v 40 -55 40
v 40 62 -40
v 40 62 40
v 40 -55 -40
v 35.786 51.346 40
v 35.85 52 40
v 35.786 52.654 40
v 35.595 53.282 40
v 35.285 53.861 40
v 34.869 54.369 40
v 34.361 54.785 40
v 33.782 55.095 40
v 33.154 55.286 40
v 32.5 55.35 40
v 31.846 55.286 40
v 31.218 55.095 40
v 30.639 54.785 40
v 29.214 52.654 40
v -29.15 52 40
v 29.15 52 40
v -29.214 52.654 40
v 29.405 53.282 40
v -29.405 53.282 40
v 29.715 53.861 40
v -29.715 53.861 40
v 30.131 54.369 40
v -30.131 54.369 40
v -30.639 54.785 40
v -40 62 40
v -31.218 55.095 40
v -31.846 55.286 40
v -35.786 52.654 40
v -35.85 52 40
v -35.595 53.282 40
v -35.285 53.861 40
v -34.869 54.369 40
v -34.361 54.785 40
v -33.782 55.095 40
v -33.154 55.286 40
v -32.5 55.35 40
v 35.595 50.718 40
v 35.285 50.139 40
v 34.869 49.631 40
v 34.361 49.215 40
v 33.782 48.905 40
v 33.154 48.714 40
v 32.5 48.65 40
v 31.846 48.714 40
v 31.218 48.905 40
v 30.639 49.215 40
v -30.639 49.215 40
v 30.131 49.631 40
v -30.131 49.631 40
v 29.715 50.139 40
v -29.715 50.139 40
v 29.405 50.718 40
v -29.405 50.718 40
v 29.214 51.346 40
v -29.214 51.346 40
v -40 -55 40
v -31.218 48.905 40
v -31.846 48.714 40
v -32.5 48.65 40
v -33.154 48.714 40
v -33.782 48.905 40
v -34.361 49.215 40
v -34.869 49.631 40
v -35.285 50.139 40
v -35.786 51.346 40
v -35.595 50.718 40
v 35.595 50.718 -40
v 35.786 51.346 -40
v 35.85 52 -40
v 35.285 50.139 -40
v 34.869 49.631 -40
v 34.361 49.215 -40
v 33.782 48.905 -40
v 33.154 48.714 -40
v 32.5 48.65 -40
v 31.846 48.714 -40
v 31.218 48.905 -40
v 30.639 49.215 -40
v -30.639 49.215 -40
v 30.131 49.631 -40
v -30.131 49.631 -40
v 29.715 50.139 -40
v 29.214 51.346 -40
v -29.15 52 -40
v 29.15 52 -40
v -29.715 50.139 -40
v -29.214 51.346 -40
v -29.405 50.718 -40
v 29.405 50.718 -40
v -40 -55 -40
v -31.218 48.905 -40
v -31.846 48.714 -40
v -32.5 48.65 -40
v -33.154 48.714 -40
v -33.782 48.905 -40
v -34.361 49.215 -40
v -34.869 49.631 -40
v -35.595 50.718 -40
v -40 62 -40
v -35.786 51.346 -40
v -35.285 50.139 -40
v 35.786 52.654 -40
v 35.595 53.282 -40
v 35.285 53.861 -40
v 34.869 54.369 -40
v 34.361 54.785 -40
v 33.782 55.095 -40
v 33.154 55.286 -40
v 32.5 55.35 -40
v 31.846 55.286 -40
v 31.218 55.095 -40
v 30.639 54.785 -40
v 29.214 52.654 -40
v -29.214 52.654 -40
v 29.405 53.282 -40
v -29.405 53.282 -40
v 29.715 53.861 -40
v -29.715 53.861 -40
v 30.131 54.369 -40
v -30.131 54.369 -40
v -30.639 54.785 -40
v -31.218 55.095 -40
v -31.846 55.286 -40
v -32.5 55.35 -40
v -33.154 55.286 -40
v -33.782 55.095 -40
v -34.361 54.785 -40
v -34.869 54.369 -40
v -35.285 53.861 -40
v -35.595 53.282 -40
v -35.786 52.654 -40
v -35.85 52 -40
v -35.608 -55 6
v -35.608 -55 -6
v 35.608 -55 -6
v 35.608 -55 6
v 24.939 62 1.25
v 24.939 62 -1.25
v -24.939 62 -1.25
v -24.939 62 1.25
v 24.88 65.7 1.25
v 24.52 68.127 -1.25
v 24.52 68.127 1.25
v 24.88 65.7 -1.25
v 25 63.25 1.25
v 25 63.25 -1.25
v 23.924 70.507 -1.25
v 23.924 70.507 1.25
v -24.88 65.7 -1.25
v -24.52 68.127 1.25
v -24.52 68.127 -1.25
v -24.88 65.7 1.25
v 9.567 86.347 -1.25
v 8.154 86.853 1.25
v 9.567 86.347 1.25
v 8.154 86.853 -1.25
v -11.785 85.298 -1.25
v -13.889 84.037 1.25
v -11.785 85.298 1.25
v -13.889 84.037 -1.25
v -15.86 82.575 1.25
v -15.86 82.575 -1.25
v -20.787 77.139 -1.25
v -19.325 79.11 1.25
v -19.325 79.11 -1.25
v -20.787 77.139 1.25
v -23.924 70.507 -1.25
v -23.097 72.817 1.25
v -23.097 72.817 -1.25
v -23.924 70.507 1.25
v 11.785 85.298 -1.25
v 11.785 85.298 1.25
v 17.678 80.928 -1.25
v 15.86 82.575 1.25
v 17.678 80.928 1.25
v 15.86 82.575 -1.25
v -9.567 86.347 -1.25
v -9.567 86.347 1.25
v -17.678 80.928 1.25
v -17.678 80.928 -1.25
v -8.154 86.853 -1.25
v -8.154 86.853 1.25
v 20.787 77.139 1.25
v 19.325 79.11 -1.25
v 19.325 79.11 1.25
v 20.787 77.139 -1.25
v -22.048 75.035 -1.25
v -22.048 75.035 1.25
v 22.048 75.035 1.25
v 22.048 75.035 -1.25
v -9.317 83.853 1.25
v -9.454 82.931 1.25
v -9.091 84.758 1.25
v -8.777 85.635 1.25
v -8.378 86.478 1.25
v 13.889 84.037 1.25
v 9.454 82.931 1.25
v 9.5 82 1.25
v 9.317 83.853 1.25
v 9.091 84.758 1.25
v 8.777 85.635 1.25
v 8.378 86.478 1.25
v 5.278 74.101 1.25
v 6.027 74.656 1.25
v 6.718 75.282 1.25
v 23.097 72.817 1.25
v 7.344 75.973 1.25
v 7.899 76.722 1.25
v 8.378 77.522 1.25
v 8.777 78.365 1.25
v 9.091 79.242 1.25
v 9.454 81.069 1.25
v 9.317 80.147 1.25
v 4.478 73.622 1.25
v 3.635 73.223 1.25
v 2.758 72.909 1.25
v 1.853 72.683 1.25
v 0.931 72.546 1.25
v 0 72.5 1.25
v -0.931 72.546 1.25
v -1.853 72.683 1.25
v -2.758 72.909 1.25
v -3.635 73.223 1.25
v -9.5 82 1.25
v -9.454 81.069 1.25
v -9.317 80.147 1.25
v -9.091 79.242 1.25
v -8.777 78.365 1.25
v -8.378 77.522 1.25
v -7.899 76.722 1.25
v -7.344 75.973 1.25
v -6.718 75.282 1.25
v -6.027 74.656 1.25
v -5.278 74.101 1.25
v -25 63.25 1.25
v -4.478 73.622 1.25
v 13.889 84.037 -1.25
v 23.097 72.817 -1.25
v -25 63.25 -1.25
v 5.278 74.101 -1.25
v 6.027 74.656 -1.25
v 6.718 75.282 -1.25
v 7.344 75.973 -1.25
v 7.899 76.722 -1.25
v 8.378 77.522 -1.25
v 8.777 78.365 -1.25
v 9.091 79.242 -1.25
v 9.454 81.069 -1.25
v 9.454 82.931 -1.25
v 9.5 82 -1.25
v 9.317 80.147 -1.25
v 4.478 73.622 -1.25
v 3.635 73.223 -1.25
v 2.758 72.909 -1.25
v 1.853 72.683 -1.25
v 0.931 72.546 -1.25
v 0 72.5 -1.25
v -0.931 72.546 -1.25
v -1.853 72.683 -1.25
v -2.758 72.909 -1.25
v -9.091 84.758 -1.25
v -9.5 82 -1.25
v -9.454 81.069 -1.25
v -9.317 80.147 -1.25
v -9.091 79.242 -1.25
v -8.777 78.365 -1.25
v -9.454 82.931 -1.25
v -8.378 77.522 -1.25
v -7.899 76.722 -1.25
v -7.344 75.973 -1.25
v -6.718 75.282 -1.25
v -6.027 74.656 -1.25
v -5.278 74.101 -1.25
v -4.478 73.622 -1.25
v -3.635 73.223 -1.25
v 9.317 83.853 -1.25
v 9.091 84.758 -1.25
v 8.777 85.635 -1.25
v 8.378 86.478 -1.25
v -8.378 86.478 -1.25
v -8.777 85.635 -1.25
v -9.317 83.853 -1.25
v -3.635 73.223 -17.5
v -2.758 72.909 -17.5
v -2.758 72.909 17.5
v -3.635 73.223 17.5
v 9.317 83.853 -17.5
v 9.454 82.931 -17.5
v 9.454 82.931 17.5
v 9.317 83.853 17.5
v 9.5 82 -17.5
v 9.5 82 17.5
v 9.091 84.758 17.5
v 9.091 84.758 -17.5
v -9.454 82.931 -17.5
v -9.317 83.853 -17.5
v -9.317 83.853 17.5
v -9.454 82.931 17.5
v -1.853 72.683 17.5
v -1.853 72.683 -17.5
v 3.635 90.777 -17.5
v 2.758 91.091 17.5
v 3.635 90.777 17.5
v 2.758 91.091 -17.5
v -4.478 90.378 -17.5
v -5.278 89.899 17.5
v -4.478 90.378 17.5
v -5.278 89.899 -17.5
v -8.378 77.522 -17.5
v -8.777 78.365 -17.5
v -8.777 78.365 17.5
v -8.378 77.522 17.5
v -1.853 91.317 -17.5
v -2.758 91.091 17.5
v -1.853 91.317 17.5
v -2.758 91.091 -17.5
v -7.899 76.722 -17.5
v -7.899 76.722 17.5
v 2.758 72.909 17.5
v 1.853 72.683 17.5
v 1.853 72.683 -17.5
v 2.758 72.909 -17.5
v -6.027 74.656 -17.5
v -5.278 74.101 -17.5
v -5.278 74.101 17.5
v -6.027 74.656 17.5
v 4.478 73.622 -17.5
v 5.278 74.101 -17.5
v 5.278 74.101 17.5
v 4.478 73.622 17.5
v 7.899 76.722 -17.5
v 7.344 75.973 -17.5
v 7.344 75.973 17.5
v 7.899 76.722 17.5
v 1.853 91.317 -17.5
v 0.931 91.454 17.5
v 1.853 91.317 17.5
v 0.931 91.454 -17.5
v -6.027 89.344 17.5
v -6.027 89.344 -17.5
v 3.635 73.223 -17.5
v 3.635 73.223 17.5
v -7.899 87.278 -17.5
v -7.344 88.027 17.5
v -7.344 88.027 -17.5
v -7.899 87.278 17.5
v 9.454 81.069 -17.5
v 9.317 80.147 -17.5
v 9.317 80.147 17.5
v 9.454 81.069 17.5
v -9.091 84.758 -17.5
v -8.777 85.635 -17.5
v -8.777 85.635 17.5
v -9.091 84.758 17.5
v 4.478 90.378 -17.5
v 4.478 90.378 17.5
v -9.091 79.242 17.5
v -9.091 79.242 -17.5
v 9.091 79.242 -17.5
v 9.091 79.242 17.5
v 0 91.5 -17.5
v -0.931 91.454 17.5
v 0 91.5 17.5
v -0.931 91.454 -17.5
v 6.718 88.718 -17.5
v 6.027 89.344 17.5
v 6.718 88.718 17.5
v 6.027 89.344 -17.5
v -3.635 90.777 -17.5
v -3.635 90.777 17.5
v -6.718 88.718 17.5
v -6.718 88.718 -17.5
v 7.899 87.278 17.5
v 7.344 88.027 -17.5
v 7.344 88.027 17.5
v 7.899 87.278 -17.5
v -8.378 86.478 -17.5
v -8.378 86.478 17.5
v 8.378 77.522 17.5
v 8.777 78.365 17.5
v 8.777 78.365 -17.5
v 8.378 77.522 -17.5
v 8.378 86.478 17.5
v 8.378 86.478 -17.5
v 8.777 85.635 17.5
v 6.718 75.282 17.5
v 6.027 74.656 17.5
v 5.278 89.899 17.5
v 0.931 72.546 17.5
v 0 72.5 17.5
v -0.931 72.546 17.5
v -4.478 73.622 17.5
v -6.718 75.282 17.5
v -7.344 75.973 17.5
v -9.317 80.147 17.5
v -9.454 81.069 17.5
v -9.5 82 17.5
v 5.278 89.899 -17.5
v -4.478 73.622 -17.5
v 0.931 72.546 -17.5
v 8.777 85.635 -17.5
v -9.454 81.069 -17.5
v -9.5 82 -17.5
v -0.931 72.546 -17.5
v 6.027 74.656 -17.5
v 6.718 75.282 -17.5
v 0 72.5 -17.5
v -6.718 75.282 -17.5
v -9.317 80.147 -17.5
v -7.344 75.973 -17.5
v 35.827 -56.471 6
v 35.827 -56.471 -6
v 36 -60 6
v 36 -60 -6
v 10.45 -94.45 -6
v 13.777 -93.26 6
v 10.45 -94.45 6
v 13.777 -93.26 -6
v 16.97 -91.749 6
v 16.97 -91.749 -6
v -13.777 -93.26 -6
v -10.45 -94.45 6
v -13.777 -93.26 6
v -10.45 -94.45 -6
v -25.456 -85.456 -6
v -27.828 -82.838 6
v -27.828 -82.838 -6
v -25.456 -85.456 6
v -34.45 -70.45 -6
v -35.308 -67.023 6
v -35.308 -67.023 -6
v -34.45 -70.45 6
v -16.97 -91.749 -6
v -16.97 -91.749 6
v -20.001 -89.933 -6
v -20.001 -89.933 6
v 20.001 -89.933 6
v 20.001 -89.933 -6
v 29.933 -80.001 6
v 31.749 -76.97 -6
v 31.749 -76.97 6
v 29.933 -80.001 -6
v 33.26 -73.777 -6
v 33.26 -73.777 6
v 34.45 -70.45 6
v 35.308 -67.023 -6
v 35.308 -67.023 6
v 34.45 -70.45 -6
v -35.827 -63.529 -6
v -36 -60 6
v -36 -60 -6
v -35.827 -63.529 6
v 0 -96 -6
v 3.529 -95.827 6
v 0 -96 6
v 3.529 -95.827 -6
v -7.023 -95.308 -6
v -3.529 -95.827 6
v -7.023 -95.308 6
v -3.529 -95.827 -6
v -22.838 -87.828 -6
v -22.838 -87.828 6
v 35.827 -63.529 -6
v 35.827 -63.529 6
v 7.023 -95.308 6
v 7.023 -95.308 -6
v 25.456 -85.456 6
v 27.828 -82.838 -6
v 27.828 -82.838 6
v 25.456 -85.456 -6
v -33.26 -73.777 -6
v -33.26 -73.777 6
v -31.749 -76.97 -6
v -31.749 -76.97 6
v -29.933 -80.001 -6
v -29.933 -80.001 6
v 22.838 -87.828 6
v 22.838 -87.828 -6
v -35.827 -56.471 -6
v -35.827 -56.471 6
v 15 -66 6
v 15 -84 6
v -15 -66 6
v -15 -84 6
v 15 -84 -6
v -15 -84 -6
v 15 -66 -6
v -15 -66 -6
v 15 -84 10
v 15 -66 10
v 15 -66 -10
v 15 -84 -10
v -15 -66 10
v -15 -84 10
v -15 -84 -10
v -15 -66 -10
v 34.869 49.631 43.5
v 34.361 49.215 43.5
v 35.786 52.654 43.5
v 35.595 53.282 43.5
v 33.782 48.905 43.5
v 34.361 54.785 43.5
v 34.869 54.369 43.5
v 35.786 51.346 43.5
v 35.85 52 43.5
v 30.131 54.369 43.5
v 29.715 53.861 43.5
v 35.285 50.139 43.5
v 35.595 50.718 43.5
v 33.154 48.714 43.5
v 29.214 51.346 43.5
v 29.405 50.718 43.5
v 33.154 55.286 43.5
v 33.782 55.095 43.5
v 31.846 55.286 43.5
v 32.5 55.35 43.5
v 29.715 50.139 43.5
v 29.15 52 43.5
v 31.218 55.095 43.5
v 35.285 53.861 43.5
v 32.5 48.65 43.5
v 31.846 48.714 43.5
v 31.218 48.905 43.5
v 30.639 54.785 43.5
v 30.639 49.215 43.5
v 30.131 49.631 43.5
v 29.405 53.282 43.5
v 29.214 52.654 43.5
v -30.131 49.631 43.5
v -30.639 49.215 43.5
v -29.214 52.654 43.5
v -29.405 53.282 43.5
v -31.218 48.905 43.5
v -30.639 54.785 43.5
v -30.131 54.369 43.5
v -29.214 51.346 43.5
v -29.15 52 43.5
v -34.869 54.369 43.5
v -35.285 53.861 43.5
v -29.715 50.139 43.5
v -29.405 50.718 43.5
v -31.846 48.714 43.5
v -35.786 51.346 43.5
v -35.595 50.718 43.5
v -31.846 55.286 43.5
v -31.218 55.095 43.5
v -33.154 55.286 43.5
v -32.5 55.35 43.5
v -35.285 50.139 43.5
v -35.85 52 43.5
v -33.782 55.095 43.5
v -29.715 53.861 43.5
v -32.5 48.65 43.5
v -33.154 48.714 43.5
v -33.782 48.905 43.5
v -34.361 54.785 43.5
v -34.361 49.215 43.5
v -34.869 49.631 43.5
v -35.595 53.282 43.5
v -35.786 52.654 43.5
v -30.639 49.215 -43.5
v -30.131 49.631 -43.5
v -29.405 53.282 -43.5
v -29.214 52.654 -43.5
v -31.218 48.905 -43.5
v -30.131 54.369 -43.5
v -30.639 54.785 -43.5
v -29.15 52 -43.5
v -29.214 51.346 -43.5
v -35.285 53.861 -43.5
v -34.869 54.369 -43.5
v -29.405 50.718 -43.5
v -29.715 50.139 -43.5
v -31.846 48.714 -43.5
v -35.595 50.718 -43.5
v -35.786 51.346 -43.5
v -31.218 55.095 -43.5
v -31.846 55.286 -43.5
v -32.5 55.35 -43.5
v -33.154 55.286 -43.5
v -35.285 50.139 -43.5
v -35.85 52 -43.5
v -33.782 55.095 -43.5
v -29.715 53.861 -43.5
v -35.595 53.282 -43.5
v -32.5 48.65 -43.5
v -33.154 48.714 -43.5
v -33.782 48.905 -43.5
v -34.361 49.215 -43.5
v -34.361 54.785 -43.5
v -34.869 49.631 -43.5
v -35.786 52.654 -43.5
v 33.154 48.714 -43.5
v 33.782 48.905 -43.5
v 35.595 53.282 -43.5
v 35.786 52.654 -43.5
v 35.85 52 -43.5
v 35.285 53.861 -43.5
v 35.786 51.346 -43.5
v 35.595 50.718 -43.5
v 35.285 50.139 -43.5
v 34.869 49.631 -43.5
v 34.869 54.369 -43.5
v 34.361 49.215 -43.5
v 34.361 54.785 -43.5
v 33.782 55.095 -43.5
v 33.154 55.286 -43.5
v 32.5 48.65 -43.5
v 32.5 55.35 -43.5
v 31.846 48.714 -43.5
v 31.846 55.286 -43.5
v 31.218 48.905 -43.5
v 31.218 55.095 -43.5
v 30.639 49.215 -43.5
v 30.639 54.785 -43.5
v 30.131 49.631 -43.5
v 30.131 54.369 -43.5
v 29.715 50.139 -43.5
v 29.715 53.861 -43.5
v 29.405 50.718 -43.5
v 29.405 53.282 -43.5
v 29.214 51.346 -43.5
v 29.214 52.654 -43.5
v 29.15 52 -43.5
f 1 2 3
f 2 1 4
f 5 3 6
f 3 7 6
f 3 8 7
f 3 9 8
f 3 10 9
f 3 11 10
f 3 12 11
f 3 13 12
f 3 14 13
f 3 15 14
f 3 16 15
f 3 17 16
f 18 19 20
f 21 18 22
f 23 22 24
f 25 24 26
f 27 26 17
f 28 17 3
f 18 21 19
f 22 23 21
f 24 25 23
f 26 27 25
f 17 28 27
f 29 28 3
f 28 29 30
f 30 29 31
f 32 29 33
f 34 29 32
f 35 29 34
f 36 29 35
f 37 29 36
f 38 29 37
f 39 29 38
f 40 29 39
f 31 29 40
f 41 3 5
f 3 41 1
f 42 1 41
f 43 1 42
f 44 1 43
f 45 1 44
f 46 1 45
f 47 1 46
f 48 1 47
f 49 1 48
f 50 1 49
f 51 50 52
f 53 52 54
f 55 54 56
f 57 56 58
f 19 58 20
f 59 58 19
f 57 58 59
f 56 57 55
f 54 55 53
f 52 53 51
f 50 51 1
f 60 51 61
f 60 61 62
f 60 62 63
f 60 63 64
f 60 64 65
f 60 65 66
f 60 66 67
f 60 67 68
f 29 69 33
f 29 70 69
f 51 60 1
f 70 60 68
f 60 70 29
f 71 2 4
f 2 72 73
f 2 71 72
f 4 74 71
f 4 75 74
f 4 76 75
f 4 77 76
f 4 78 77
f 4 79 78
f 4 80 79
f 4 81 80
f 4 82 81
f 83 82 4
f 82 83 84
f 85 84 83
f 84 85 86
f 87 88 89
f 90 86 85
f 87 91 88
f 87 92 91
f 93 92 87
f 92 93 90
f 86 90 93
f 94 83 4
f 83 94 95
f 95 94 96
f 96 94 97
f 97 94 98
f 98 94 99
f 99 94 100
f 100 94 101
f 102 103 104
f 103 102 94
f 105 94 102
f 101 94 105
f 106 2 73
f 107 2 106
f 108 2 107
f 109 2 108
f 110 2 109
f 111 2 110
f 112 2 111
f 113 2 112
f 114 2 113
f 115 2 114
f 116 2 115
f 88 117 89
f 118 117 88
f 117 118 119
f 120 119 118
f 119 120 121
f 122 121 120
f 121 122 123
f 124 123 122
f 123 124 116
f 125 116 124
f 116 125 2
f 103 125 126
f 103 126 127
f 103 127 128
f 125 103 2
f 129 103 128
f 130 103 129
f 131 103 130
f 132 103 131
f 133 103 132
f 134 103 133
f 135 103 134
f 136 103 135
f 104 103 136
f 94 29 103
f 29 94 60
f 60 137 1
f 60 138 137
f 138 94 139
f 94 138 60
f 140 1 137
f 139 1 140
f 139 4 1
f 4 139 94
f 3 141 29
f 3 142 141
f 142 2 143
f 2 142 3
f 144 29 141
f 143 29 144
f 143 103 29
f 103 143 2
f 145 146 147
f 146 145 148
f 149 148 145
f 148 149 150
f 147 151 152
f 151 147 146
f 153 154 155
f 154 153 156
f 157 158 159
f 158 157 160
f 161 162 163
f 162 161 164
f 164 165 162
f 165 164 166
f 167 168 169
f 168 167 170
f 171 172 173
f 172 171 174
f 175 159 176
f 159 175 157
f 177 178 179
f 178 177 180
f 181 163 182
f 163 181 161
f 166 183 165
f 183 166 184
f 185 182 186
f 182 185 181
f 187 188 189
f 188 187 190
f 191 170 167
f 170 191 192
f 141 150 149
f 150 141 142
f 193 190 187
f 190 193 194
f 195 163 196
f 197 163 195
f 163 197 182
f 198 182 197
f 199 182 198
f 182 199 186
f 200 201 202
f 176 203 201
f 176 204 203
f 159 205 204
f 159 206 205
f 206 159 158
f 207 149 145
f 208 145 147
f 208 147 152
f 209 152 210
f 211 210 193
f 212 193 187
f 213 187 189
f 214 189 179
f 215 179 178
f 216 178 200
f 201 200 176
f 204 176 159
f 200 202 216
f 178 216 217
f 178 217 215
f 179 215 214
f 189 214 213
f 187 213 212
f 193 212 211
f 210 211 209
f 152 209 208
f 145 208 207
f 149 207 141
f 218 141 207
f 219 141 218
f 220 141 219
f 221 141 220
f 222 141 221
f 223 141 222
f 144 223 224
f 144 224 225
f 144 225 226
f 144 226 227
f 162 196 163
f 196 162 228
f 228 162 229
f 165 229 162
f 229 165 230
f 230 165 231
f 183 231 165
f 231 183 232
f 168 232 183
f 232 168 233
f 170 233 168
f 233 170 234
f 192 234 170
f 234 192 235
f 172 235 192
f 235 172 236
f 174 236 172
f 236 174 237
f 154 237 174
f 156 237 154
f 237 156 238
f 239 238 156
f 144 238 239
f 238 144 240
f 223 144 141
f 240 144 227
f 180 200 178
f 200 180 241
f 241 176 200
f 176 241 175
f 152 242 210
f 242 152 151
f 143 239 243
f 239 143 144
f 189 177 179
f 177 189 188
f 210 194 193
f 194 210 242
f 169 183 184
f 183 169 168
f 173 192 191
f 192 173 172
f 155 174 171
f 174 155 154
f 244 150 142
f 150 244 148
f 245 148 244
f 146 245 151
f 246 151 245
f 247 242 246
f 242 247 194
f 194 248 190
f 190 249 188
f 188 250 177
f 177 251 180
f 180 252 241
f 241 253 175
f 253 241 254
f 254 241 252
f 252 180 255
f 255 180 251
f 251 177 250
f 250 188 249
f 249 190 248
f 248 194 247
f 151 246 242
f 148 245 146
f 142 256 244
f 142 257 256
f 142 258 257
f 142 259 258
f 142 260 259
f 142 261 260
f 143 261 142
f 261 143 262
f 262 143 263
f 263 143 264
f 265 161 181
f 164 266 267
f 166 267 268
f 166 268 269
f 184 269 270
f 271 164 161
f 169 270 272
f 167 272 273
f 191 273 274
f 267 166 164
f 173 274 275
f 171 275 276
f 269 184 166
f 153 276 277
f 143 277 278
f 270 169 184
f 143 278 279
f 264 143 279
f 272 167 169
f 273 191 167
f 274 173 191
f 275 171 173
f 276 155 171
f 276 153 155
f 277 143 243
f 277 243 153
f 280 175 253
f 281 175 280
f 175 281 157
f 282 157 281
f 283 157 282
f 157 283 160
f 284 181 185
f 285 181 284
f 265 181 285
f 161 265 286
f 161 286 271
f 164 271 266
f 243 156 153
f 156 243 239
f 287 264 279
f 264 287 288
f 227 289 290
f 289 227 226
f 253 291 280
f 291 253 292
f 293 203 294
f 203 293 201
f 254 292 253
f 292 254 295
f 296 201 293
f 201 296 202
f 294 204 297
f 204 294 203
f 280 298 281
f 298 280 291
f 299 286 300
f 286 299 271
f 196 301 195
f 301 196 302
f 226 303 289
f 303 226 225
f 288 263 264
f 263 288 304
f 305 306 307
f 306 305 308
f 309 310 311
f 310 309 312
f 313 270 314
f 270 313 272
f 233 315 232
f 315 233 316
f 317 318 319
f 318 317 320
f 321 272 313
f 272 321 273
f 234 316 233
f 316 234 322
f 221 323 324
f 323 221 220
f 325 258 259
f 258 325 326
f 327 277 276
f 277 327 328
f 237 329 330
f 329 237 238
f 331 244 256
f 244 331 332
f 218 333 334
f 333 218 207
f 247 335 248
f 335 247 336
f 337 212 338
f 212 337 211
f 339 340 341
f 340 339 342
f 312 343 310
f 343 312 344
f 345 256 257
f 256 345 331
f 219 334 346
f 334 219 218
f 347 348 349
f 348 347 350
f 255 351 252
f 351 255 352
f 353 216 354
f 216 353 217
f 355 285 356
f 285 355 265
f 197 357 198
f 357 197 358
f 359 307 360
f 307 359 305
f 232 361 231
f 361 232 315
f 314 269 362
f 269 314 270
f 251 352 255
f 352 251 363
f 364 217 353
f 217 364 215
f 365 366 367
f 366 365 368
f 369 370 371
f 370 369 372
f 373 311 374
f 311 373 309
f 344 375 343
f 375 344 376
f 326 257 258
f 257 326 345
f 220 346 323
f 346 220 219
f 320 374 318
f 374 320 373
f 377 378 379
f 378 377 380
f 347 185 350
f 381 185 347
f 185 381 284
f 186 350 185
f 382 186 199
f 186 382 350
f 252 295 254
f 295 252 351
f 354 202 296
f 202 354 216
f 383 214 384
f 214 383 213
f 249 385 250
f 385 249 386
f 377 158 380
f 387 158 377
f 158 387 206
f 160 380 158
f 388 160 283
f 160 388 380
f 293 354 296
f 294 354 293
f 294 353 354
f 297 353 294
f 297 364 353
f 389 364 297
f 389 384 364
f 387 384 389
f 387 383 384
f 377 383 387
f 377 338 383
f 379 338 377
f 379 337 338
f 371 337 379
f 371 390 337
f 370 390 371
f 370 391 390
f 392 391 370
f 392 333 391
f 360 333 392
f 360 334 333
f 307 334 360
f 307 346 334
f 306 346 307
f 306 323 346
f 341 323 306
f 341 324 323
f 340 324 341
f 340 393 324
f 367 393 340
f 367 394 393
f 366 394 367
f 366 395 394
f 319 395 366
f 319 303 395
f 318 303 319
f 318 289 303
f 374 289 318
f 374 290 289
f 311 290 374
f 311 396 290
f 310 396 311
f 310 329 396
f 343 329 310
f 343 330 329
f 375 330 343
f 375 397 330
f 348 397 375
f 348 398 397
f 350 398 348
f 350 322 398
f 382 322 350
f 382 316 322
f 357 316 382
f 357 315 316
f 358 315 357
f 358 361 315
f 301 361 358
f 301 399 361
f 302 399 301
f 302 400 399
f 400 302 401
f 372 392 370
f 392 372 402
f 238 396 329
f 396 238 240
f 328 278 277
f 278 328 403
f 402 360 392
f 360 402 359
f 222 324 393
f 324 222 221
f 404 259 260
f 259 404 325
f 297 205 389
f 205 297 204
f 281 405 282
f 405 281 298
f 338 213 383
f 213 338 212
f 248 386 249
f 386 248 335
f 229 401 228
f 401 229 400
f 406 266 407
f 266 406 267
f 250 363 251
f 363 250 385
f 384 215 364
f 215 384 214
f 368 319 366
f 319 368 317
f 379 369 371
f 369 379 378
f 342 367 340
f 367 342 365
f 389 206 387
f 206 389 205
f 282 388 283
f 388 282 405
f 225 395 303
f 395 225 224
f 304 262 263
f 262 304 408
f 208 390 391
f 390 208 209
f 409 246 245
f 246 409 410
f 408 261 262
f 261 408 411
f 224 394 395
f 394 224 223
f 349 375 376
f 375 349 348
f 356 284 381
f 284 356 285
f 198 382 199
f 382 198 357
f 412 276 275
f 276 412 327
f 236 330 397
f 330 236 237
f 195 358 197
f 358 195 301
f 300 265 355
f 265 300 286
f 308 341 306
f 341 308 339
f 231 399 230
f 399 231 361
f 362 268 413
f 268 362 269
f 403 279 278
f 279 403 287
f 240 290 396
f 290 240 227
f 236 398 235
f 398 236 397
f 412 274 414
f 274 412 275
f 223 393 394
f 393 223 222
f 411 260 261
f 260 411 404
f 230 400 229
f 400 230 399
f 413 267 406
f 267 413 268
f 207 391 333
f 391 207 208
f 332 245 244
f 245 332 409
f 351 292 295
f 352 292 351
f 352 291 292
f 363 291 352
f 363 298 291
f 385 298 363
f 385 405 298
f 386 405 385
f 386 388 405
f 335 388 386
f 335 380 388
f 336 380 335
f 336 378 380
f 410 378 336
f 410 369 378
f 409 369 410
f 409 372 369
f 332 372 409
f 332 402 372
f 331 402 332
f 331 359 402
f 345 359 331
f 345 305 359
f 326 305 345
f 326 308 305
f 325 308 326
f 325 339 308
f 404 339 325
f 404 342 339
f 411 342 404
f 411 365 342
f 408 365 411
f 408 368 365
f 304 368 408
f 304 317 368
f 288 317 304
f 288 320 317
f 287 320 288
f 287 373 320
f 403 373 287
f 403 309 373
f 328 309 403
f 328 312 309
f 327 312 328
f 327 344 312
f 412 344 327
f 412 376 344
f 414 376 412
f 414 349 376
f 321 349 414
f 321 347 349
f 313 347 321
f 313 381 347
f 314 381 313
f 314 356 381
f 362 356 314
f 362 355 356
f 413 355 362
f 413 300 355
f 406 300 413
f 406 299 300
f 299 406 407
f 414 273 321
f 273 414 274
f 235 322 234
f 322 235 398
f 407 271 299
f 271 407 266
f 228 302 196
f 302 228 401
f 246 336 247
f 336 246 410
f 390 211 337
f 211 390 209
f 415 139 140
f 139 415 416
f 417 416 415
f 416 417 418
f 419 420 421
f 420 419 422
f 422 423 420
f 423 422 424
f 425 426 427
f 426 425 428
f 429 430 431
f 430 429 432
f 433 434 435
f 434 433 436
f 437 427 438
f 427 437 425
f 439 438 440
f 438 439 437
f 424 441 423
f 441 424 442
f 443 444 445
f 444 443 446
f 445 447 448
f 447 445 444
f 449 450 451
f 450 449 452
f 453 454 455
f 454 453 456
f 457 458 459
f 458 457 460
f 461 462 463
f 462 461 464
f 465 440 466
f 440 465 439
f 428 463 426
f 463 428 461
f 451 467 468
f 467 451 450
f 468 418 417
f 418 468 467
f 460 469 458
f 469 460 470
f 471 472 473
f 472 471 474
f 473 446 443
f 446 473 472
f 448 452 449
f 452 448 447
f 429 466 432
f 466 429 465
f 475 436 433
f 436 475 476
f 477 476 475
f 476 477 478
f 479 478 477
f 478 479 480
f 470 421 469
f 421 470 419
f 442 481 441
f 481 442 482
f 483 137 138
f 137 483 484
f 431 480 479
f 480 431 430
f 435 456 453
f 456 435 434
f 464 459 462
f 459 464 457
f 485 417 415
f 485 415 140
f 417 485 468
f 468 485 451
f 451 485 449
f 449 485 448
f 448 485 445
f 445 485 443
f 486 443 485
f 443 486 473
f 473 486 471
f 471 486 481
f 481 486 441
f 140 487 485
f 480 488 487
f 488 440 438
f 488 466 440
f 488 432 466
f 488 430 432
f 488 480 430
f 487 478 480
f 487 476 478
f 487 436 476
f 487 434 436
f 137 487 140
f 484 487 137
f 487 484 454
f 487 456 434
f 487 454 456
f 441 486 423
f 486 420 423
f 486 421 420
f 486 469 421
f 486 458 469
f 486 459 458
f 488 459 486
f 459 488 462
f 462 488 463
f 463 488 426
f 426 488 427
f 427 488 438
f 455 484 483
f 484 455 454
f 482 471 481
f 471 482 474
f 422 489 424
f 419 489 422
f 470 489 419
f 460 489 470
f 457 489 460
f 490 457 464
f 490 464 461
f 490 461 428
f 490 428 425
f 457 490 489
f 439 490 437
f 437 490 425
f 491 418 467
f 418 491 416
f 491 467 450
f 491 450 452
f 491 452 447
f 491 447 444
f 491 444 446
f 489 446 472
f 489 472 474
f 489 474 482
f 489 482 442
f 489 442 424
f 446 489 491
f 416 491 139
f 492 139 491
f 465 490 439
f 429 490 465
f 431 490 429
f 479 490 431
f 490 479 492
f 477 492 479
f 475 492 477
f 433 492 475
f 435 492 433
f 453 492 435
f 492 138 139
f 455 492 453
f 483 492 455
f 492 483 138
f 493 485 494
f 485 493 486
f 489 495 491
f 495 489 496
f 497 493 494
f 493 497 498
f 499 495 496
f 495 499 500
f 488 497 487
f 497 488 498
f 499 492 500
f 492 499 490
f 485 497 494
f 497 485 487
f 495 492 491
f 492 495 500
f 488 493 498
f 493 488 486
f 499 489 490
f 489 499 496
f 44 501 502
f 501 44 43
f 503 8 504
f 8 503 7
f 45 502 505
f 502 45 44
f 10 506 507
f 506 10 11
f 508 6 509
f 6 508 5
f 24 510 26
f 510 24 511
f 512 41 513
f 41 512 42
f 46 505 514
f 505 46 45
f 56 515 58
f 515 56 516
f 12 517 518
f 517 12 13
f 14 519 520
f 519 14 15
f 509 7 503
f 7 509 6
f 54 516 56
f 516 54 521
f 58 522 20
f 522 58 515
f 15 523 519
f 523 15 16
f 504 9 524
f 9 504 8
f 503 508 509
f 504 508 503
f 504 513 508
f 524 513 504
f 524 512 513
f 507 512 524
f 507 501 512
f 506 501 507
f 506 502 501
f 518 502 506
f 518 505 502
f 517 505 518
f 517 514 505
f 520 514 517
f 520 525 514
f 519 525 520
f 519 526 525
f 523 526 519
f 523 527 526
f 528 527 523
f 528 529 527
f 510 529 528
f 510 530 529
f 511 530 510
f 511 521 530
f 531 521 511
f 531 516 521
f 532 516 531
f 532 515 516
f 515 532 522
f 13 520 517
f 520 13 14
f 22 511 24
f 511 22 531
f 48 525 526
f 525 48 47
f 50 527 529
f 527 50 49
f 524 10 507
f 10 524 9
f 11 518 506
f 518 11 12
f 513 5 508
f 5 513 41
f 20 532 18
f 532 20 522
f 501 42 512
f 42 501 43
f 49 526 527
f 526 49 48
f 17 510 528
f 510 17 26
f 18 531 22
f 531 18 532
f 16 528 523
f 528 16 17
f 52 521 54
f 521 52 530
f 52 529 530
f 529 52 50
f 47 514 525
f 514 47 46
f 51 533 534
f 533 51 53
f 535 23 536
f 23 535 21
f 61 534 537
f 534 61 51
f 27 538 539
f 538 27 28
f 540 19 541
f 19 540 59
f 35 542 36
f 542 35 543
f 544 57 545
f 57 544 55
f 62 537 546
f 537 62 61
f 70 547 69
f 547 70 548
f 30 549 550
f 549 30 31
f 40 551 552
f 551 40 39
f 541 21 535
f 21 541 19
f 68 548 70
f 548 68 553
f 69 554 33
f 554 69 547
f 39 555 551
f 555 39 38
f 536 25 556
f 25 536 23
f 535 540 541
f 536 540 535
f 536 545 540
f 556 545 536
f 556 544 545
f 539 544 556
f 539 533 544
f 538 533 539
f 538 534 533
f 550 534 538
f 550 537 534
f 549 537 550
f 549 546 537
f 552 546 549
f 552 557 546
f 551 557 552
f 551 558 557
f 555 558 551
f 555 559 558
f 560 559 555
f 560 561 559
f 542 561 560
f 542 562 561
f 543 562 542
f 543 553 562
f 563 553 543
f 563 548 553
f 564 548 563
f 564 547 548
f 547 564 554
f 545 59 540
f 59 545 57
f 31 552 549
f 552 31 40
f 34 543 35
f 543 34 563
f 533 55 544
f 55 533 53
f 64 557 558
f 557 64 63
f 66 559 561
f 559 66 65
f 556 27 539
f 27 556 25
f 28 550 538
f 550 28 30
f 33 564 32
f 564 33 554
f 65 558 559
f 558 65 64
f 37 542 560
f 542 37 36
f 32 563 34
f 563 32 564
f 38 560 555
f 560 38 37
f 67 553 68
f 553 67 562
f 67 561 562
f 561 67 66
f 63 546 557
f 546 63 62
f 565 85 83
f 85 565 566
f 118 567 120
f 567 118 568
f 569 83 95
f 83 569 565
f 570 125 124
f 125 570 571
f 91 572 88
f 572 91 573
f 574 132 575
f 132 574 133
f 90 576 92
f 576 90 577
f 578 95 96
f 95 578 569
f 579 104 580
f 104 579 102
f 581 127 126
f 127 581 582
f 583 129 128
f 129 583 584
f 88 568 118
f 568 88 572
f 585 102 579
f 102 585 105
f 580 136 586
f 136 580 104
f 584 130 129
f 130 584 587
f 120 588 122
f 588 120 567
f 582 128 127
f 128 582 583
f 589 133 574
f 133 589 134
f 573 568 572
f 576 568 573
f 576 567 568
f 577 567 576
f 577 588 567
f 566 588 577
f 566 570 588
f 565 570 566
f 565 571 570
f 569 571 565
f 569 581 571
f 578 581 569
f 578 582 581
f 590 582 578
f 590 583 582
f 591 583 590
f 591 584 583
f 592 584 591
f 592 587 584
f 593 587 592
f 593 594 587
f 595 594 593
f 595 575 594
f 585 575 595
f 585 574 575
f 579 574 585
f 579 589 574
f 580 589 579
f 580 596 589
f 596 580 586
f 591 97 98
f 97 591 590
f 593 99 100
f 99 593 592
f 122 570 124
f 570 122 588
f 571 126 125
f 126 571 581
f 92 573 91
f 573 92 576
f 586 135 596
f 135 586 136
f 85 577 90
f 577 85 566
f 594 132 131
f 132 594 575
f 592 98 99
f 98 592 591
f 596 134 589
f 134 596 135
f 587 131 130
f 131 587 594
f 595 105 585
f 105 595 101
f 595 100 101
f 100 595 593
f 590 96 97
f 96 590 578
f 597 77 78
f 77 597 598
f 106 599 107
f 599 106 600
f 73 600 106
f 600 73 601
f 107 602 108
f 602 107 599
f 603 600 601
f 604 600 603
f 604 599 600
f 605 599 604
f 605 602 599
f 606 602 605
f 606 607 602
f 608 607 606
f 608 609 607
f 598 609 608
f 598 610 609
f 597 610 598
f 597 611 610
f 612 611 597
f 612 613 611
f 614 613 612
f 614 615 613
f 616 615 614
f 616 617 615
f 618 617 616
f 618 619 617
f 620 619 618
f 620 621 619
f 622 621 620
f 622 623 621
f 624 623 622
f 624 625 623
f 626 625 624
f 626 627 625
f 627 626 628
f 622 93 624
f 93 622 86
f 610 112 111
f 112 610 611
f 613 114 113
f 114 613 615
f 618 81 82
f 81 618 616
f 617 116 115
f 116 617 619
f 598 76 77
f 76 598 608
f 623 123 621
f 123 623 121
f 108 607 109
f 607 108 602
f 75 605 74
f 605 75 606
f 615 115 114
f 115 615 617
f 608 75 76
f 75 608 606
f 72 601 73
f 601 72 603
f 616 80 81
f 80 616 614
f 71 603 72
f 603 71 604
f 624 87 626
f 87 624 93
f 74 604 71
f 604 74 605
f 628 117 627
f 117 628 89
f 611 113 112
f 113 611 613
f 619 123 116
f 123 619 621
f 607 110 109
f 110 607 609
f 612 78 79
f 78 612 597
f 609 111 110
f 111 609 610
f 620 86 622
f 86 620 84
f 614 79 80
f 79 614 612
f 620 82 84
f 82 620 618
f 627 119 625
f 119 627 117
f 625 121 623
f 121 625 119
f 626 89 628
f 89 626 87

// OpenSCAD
// Parameters
motor_frame_size_mm = 80; //[40:160:1]
body_length_mm = 110; //[55:220:1]
body_corner_radius_mm = 2; //[1:6:1]
faceplate_thickness_mm = 8; //[4:16:1]
faceplate_size_mm = 80; //[40:160:1]
mount_hole_pattern_mm = 65; //[40:120:1]
mount_hole_diameter_mm = 6.5; //[3:12:0.1]
mount_hole_depth_mm = 12; //[6:30:1]
pilot_diameter_mm = 50; //[25:100:1]
pilot_length_mm = 2.5; //[1:8:0.1]
shaft_diameter_mm = 19; //[6:40:0.1]
shaft_length_mm = 35; //[10:80:1]
rear_cap_diameter_mm = 72; //[36:140:1]
rear_cap_length_mm = 12; //[6:30:1]
rear_connector_width_mm = 30; //[15:60:1]
rear_connector_height_mm = 20; //[10:50:1]
rear_connector_length_mm = 18; //[8:40:1]
overlap_mm = 1; //[0.5:2:0.1]
hole_clearance_mm = 0.2; //[0:0.6:0.05]

// Servo Motor - complete geometry
module servo_motor() {
  color([0.15, 0.2, 0.35]) {
    // Motor Body
    translate([0, 0, 0])
      cube([motor_frame_size_mm, body_length_mm, motor_frame_size_mm], center=true);

    // Front Faceplate
    translate([0, (body_length_mm/2) + (faceplate_thickness_mm/2) - overlap_mm, 0])
      cube([faceplate_size_mm, faceplate_thickness_mm, faceplate_size_mm], center=true);

    // Shaft Boss/Flange
    translate([0, (body_length_mm/2) + faceplate_thickness_mm - overlap_mm + (pilot_length_mm/2), 0])
      cylinder(r=pilot_diameter_mm/2, h=pilot_length_mm, center=true, $fn=64);

    // Output Shaft
    color("Silver")
    translate([0, (body_length_mm/2) + faceplate_thickness_mm + pilot_length_mm - overlap_mm + (shaft_length_mm/2), 0])
      cylinder(r=shaft_diameter_mm/2, h=shaft_length_mm, center=true, $fn=64);

    // Rear Cap
    translate([0, -(body_length_mm/2) - (rear_cap_length_mm/2) + overlap_mm, 0])
      cylinder(r=rear_cap_diameter_mm/2, h=rear_cap_length_mm, center=true, $fn=64);

    // Rear Connector Block
    translate([0, -(body_length_mm/2) - rear_cap_length_mm + overlap_mm - (rear_connector_length_mm/2), 0])
      cube([rear_connector_width_mm, rear_connector_length_mm, rear_connector_height_mm], center=true);
  }

  // Mounting Holes
  color("Black")
  difference() {
    union() {
      translate([mount_hole_pattern_mm/2, (body_length_mm/2) + (faceplate_thickness_mm/2) - overlap_mm - (mount_hole_depth_mm/2), mount_hole_pattern_mm/2])
        cylinder(r=(mount_hole_diameter_mm + hole_clearance_mm)/2, h=faceplate_thickness_mm + mount_hole_depth_mm + overlap_mm*2, center=true, $fn=32);
      translate([-mount_hole_pattern_mm/2, (body_length_mm/2) + (faceplate_thickness_mm/2) - overlap_mm - (mount_hole_depth_mm/2), mount_hole_pattern_mm/2])
        cylinder(r=(mount_hole_diameter_mm + hole_clearance_mm)/2, h=faceplate_thickness_mm + mount_hole_depth_mm + overlap_mm*2, center=true, $fn=32);
      translate([-mount_hole_pattern_mm/2, (body_length_mm/2) + (faceplate_thickness_mm/2) - overlap_mm - (mount_hole_depth_mm/2), -mount_hole_pattern_mm/2])
        cylinder(r=(mount_hole_diameter_mm + hole_clearance_mm)/2, h=faceplate_thickness_mm + mount_hole_depth_mm + overlap_mm*2, center=true, $fn=32);
      translate([mount_hole_pattern_mm/2, (body_length_mm/2) + (faceplate_thickness_mm/2) - overlap_mm - (mount_hole_depth_mm/2), -mount_hole_pattern_mm/2])
        cylinder(r=(mount_hole_diameter_mm + hole_clearance_mm)/2, h=faceplate_thickness_mm + mount_hole_depth_mm + overlap_mm*2, center=true, $fn=32);
    }
  }
}

// Assembly
module assembly() {
  servo_motor();
}

assembly();
